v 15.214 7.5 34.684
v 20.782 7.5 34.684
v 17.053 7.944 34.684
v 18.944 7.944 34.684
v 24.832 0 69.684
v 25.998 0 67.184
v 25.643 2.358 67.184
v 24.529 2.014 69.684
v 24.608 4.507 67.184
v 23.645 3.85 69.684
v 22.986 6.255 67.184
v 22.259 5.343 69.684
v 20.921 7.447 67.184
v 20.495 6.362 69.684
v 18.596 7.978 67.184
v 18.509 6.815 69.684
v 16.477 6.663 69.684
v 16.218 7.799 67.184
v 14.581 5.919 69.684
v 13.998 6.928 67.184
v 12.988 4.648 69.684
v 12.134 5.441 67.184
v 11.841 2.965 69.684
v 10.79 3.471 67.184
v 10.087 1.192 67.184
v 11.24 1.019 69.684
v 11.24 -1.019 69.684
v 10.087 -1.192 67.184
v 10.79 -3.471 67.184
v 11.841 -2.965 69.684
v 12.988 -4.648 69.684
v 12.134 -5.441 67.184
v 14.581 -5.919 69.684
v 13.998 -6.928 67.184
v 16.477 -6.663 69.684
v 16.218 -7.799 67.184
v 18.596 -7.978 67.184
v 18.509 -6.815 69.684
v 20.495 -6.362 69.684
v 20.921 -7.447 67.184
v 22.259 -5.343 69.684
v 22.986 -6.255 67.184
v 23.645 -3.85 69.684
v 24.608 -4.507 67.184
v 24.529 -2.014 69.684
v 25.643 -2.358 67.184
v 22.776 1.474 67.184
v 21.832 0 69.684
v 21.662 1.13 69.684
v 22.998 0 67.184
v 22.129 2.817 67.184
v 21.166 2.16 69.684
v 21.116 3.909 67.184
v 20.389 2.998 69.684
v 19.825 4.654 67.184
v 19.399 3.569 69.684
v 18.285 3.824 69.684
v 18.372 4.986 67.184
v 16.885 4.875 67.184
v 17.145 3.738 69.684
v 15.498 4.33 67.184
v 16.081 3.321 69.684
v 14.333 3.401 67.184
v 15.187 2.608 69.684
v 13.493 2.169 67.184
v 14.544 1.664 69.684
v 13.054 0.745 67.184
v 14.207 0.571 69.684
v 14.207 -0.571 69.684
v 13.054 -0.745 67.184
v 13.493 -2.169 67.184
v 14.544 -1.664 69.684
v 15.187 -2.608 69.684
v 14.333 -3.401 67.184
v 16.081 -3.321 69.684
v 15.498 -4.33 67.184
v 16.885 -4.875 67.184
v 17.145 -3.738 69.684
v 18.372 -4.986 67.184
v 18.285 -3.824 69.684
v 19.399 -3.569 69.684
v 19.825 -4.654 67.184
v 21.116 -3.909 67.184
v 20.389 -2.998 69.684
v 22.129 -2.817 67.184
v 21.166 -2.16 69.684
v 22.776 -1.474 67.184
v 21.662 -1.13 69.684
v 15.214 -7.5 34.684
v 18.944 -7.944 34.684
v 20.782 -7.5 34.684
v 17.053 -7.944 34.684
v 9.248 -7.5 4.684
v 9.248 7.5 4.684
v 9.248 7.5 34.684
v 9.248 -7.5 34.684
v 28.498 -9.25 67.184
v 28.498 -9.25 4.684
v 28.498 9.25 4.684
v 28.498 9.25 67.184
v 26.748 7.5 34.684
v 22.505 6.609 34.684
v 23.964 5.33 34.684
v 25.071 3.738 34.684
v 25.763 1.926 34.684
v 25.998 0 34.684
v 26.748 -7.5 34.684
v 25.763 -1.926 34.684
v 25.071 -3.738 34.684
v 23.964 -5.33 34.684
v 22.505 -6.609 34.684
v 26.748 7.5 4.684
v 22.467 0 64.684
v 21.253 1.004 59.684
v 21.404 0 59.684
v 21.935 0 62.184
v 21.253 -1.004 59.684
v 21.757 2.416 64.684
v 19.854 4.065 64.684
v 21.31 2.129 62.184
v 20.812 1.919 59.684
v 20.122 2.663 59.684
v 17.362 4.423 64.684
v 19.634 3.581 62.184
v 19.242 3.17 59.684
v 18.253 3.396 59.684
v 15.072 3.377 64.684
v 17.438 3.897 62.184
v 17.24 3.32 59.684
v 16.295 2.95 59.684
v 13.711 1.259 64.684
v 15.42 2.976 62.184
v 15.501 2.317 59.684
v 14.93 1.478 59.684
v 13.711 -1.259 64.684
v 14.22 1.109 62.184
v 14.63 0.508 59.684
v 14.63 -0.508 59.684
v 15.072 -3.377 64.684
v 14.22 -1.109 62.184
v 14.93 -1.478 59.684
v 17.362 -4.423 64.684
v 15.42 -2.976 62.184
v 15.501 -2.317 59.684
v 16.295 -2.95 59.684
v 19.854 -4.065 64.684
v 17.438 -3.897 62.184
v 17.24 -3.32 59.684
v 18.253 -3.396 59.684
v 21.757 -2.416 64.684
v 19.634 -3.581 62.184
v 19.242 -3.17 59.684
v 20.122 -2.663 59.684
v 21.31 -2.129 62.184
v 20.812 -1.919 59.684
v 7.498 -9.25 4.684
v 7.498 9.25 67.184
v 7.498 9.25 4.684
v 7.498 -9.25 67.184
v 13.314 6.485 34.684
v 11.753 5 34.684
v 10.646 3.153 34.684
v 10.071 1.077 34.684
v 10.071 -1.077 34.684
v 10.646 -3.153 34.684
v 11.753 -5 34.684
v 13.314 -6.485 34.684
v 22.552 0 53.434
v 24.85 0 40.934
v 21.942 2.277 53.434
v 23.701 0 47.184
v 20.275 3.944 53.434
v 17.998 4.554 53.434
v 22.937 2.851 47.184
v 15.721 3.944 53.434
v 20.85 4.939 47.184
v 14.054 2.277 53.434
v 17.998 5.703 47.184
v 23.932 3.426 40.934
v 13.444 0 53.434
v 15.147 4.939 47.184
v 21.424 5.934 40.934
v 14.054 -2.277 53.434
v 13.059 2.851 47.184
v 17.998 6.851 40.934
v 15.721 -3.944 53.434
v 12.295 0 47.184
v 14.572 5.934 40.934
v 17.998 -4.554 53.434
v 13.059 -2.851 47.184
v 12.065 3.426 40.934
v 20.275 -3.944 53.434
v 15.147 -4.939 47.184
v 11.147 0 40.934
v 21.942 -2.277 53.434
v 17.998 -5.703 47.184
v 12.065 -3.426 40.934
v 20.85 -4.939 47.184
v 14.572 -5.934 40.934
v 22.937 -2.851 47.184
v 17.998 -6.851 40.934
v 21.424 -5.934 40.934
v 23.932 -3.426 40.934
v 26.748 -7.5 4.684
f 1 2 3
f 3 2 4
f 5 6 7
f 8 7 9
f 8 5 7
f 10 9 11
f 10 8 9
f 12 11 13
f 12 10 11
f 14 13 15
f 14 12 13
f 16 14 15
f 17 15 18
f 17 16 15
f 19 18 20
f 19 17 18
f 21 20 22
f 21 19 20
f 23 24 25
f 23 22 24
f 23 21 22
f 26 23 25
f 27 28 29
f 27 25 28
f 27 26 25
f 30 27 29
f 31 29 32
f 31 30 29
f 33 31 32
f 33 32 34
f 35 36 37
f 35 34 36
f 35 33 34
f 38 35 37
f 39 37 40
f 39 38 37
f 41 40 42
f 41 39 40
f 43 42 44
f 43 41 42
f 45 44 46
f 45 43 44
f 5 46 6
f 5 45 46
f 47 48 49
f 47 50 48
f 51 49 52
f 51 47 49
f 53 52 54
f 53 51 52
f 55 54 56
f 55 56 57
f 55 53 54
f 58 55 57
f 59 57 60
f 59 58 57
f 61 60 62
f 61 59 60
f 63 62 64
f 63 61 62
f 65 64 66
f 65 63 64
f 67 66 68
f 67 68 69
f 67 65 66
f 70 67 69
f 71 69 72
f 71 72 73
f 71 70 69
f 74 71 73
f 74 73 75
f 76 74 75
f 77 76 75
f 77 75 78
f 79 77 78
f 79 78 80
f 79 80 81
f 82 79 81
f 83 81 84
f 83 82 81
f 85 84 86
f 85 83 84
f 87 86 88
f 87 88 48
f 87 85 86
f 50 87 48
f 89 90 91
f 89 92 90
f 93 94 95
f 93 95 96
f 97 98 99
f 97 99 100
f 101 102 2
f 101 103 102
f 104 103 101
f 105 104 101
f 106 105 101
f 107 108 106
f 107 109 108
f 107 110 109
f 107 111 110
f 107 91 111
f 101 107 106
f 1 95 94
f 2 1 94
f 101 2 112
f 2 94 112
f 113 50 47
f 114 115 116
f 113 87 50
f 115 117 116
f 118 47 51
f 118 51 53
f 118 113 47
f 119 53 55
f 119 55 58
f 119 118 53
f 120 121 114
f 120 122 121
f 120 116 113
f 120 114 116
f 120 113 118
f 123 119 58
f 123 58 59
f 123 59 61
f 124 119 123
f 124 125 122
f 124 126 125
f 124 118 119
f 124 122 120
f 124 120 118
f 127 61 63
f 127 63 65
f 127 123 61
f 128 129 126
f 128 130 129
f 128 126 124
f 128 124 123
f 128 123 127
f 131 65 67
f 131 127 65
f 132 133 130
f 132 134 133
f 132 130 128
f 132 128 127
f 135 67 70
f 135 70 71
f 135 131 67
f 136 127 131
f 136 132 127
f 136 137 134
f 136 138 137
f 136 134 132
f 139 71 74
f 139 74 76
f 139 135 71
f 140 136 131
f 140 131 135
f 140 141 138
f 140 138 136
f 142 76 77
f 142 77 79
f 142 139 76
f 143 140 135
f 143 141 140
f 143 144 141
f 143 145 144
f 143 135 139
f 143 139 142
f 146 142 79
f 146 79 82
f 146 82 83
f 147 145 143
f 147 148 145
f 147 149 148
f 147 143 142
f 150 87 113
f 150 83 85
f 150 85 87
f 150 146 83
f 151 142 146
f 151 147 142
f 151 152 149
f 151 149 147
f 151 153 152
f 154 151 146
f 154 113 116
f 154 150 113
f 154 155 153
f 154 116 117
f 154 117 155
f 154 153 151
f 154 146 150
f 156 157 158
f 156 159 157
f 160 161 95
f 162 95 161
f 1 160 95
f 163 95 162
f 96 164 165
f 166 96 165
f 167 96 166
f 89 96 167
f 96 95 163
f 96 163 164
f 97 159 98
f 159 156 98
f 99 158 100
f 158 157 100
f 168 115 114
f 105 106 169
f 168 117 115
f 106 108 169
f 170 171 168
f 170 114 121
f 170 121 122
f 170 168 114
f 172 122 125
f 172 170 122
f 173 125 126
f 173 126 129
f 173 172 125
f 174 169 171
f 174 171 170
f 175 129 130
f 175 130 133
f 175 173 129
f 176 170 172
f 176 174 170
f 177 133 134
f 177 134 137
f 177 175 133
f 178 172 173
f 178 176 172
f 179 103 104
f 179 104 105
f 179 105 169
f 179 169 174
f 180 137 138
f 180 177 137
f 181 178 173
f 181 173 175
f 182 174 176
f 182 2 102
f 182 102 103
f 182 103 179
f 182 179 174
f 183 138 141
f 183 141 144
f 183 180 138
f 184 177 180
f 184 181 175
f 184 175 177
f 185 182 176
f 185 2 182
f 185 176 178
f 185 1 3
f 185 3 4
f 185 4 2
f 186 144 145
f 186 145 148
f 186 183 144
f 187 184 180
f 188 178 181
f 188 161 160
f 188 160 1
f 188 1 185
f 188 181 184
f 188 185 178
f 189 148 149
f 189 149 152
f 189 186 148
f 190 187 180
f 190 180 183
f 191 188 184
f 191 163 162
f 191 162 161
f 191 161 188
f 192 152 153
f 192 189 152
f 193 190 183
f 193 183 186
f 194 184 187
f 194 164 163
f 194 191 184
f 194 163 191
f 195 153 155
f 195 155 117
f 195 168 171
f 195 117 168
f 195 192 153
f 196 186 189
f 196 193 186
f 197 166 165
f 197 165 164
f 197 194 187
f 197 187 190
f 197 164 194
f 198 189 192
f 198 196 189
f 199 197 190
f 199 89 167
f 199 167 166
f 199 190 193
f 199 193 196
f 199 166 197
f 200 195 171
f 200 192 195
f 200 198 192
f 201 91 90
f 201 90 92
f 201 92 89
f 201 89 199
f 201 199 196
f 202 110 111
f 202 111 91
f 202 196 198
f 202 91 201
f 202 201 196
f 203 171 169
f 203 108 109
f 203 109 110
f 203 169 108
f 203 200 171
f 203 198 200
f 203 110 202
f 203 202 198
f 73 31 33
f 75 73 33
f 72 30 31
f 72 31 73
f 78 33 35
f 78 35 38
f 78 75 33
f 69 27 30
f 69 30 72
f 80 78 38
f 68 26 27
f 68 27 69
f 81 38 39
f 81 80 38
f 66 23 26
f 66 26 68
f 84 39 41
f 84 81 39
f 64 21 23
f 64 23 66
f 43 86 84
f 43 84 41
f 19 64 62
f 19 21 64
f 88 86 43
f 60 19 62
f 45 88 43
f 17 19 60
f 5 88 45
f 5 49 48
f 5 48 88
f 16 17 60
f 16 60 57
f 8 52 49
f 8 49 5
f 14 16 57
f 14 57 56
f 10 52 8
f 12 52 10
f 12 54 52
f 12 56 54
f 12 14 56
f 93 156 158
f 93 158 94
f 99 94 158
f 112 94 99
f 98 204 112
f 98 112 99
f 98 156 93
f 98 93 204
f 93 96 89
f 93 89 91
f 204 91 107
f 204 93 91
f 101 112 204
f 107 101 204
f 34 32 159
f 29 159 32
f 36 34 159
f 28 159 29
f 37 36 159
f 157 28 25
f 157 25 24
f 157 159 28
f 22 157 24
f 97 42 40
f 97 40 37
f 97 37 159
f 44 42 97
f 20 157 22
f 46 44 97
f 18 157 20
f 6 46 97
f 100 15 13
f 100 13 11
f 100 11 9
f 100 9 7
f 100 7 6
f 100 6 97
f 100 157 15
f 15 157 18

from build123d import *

# Parameters (mm, degrees)
F0_W     = 8
F0_H     = 30
F2_DEPTH = 9.25
F4_DEPTH = 32.5
F5_W     = 17.5
F5_H     = 15
F6_DEPTH = 30


with BuildPart() as f1:
    # F0 (on Front) → F1 (revolve)
    with BuildSketch(Plane.XZ):
        Polygon((21.4039260229, 59.6839201814), (25.9981002354, 34.6839201814), (24.4039260229, 59.6839201814), align=None)
        Polygon((24.4039260229, 59.6839201814), (25.9981002354, 67.1839201814), (22.9981002354, 67.1839201814), (21.4039260229, 59.6839201814), align=None)
        Polygon((22.9981002354, 67.1839201814), (25.9981002354, 67.1839201814), (24.83233109, 69.6839201814), (22.9981002354, 69.6839201814), align=None)
        Polygon((21.83233109, 69.6839201814), (22.9981002354, 67.1839201814), (22.9981002354, 69.6839201814), align=None)
        Polygon((24.4039260229, 59.6839201814), (25.9981002354, 34.6839201814), (25.9981002354, 67.1839201814), align=None)
    revolve(axis=Axis((17.9981002354, 0, 37.1839201814), (0, 0, 1)))

    # F0 (on Front) → F2 (join, symmetric)
    with BuildSketch(Plane.XZ):
        Polygon((7.4981002354, 4.6839201814), (9.9981002354, 4.6839201814), (9.9981002354, 34.6839201814), (9.9981002354, 67.1839201814), (7.4981002354, 67.1839201814), align=None)
        Polygon((25.9981002354, 34.6839201814), (25.9981002354, 4.6839201814), (28.4981002354, 4.6839201814), (28.4981002354, 67.1839201814), (25.9981002354, 67.1839201814), align=None)
        with Locations((13.9981002354, 19.6839201814)):
            Rectangle(F0_W, F0_H)
        with Locations((21.9981002354, 19.6839201814)):
            Rectangle(F0_W, F0_H)
    extrude(amount=F2_DEPTH, both=True)

    # F3 (on face) → F4 (join, through all)
    with BuildSketch(Plane.XY.offset(34.6839201814)):
        with BuildLine():
            Line((25.9981002354, -9.25), (25.9981002354, 0))
            ThreePointArc((25.9981002354, 0), (17.998100241, -8), (9.9981002354, -1.11e-08))
            Line((9.9981002354, -1.11e-08), (9.9981002354, -9.25))
            Line((9.9981002354, -9.25), (25.9981002354, -9.25))
        make_face()
        with BuildLine():
            ThreePointArc((9.9981002354, -1.11e-08), (17.9981002299, 8), (25.9981002354, 0))
            Line((25.9981002354, 0), (25.9981002354, 9.25))
            Line((25.9981002354, 9.25), (9.9981002354, 9.25))
            Line((9.9981002354, 9.25), (9.9981002354, -1.11e-08))
        make_face()
    extrude(amount=F4_DEPTH)

    # F5 (on face) → F6 (cut)
    with BuildSketch(Plane(origin=(0, 0, 4.6839201814), x_dir=(1, 0, 0), z_dir=(0, 0, -1))):
        with Locations((17.9981002354, 0)):
            Rectangle(F5_W, F5_H)
    extrude(amount=-F6_DEPTH, mode=Mode.SUBTRACT)


solid = f1.part
